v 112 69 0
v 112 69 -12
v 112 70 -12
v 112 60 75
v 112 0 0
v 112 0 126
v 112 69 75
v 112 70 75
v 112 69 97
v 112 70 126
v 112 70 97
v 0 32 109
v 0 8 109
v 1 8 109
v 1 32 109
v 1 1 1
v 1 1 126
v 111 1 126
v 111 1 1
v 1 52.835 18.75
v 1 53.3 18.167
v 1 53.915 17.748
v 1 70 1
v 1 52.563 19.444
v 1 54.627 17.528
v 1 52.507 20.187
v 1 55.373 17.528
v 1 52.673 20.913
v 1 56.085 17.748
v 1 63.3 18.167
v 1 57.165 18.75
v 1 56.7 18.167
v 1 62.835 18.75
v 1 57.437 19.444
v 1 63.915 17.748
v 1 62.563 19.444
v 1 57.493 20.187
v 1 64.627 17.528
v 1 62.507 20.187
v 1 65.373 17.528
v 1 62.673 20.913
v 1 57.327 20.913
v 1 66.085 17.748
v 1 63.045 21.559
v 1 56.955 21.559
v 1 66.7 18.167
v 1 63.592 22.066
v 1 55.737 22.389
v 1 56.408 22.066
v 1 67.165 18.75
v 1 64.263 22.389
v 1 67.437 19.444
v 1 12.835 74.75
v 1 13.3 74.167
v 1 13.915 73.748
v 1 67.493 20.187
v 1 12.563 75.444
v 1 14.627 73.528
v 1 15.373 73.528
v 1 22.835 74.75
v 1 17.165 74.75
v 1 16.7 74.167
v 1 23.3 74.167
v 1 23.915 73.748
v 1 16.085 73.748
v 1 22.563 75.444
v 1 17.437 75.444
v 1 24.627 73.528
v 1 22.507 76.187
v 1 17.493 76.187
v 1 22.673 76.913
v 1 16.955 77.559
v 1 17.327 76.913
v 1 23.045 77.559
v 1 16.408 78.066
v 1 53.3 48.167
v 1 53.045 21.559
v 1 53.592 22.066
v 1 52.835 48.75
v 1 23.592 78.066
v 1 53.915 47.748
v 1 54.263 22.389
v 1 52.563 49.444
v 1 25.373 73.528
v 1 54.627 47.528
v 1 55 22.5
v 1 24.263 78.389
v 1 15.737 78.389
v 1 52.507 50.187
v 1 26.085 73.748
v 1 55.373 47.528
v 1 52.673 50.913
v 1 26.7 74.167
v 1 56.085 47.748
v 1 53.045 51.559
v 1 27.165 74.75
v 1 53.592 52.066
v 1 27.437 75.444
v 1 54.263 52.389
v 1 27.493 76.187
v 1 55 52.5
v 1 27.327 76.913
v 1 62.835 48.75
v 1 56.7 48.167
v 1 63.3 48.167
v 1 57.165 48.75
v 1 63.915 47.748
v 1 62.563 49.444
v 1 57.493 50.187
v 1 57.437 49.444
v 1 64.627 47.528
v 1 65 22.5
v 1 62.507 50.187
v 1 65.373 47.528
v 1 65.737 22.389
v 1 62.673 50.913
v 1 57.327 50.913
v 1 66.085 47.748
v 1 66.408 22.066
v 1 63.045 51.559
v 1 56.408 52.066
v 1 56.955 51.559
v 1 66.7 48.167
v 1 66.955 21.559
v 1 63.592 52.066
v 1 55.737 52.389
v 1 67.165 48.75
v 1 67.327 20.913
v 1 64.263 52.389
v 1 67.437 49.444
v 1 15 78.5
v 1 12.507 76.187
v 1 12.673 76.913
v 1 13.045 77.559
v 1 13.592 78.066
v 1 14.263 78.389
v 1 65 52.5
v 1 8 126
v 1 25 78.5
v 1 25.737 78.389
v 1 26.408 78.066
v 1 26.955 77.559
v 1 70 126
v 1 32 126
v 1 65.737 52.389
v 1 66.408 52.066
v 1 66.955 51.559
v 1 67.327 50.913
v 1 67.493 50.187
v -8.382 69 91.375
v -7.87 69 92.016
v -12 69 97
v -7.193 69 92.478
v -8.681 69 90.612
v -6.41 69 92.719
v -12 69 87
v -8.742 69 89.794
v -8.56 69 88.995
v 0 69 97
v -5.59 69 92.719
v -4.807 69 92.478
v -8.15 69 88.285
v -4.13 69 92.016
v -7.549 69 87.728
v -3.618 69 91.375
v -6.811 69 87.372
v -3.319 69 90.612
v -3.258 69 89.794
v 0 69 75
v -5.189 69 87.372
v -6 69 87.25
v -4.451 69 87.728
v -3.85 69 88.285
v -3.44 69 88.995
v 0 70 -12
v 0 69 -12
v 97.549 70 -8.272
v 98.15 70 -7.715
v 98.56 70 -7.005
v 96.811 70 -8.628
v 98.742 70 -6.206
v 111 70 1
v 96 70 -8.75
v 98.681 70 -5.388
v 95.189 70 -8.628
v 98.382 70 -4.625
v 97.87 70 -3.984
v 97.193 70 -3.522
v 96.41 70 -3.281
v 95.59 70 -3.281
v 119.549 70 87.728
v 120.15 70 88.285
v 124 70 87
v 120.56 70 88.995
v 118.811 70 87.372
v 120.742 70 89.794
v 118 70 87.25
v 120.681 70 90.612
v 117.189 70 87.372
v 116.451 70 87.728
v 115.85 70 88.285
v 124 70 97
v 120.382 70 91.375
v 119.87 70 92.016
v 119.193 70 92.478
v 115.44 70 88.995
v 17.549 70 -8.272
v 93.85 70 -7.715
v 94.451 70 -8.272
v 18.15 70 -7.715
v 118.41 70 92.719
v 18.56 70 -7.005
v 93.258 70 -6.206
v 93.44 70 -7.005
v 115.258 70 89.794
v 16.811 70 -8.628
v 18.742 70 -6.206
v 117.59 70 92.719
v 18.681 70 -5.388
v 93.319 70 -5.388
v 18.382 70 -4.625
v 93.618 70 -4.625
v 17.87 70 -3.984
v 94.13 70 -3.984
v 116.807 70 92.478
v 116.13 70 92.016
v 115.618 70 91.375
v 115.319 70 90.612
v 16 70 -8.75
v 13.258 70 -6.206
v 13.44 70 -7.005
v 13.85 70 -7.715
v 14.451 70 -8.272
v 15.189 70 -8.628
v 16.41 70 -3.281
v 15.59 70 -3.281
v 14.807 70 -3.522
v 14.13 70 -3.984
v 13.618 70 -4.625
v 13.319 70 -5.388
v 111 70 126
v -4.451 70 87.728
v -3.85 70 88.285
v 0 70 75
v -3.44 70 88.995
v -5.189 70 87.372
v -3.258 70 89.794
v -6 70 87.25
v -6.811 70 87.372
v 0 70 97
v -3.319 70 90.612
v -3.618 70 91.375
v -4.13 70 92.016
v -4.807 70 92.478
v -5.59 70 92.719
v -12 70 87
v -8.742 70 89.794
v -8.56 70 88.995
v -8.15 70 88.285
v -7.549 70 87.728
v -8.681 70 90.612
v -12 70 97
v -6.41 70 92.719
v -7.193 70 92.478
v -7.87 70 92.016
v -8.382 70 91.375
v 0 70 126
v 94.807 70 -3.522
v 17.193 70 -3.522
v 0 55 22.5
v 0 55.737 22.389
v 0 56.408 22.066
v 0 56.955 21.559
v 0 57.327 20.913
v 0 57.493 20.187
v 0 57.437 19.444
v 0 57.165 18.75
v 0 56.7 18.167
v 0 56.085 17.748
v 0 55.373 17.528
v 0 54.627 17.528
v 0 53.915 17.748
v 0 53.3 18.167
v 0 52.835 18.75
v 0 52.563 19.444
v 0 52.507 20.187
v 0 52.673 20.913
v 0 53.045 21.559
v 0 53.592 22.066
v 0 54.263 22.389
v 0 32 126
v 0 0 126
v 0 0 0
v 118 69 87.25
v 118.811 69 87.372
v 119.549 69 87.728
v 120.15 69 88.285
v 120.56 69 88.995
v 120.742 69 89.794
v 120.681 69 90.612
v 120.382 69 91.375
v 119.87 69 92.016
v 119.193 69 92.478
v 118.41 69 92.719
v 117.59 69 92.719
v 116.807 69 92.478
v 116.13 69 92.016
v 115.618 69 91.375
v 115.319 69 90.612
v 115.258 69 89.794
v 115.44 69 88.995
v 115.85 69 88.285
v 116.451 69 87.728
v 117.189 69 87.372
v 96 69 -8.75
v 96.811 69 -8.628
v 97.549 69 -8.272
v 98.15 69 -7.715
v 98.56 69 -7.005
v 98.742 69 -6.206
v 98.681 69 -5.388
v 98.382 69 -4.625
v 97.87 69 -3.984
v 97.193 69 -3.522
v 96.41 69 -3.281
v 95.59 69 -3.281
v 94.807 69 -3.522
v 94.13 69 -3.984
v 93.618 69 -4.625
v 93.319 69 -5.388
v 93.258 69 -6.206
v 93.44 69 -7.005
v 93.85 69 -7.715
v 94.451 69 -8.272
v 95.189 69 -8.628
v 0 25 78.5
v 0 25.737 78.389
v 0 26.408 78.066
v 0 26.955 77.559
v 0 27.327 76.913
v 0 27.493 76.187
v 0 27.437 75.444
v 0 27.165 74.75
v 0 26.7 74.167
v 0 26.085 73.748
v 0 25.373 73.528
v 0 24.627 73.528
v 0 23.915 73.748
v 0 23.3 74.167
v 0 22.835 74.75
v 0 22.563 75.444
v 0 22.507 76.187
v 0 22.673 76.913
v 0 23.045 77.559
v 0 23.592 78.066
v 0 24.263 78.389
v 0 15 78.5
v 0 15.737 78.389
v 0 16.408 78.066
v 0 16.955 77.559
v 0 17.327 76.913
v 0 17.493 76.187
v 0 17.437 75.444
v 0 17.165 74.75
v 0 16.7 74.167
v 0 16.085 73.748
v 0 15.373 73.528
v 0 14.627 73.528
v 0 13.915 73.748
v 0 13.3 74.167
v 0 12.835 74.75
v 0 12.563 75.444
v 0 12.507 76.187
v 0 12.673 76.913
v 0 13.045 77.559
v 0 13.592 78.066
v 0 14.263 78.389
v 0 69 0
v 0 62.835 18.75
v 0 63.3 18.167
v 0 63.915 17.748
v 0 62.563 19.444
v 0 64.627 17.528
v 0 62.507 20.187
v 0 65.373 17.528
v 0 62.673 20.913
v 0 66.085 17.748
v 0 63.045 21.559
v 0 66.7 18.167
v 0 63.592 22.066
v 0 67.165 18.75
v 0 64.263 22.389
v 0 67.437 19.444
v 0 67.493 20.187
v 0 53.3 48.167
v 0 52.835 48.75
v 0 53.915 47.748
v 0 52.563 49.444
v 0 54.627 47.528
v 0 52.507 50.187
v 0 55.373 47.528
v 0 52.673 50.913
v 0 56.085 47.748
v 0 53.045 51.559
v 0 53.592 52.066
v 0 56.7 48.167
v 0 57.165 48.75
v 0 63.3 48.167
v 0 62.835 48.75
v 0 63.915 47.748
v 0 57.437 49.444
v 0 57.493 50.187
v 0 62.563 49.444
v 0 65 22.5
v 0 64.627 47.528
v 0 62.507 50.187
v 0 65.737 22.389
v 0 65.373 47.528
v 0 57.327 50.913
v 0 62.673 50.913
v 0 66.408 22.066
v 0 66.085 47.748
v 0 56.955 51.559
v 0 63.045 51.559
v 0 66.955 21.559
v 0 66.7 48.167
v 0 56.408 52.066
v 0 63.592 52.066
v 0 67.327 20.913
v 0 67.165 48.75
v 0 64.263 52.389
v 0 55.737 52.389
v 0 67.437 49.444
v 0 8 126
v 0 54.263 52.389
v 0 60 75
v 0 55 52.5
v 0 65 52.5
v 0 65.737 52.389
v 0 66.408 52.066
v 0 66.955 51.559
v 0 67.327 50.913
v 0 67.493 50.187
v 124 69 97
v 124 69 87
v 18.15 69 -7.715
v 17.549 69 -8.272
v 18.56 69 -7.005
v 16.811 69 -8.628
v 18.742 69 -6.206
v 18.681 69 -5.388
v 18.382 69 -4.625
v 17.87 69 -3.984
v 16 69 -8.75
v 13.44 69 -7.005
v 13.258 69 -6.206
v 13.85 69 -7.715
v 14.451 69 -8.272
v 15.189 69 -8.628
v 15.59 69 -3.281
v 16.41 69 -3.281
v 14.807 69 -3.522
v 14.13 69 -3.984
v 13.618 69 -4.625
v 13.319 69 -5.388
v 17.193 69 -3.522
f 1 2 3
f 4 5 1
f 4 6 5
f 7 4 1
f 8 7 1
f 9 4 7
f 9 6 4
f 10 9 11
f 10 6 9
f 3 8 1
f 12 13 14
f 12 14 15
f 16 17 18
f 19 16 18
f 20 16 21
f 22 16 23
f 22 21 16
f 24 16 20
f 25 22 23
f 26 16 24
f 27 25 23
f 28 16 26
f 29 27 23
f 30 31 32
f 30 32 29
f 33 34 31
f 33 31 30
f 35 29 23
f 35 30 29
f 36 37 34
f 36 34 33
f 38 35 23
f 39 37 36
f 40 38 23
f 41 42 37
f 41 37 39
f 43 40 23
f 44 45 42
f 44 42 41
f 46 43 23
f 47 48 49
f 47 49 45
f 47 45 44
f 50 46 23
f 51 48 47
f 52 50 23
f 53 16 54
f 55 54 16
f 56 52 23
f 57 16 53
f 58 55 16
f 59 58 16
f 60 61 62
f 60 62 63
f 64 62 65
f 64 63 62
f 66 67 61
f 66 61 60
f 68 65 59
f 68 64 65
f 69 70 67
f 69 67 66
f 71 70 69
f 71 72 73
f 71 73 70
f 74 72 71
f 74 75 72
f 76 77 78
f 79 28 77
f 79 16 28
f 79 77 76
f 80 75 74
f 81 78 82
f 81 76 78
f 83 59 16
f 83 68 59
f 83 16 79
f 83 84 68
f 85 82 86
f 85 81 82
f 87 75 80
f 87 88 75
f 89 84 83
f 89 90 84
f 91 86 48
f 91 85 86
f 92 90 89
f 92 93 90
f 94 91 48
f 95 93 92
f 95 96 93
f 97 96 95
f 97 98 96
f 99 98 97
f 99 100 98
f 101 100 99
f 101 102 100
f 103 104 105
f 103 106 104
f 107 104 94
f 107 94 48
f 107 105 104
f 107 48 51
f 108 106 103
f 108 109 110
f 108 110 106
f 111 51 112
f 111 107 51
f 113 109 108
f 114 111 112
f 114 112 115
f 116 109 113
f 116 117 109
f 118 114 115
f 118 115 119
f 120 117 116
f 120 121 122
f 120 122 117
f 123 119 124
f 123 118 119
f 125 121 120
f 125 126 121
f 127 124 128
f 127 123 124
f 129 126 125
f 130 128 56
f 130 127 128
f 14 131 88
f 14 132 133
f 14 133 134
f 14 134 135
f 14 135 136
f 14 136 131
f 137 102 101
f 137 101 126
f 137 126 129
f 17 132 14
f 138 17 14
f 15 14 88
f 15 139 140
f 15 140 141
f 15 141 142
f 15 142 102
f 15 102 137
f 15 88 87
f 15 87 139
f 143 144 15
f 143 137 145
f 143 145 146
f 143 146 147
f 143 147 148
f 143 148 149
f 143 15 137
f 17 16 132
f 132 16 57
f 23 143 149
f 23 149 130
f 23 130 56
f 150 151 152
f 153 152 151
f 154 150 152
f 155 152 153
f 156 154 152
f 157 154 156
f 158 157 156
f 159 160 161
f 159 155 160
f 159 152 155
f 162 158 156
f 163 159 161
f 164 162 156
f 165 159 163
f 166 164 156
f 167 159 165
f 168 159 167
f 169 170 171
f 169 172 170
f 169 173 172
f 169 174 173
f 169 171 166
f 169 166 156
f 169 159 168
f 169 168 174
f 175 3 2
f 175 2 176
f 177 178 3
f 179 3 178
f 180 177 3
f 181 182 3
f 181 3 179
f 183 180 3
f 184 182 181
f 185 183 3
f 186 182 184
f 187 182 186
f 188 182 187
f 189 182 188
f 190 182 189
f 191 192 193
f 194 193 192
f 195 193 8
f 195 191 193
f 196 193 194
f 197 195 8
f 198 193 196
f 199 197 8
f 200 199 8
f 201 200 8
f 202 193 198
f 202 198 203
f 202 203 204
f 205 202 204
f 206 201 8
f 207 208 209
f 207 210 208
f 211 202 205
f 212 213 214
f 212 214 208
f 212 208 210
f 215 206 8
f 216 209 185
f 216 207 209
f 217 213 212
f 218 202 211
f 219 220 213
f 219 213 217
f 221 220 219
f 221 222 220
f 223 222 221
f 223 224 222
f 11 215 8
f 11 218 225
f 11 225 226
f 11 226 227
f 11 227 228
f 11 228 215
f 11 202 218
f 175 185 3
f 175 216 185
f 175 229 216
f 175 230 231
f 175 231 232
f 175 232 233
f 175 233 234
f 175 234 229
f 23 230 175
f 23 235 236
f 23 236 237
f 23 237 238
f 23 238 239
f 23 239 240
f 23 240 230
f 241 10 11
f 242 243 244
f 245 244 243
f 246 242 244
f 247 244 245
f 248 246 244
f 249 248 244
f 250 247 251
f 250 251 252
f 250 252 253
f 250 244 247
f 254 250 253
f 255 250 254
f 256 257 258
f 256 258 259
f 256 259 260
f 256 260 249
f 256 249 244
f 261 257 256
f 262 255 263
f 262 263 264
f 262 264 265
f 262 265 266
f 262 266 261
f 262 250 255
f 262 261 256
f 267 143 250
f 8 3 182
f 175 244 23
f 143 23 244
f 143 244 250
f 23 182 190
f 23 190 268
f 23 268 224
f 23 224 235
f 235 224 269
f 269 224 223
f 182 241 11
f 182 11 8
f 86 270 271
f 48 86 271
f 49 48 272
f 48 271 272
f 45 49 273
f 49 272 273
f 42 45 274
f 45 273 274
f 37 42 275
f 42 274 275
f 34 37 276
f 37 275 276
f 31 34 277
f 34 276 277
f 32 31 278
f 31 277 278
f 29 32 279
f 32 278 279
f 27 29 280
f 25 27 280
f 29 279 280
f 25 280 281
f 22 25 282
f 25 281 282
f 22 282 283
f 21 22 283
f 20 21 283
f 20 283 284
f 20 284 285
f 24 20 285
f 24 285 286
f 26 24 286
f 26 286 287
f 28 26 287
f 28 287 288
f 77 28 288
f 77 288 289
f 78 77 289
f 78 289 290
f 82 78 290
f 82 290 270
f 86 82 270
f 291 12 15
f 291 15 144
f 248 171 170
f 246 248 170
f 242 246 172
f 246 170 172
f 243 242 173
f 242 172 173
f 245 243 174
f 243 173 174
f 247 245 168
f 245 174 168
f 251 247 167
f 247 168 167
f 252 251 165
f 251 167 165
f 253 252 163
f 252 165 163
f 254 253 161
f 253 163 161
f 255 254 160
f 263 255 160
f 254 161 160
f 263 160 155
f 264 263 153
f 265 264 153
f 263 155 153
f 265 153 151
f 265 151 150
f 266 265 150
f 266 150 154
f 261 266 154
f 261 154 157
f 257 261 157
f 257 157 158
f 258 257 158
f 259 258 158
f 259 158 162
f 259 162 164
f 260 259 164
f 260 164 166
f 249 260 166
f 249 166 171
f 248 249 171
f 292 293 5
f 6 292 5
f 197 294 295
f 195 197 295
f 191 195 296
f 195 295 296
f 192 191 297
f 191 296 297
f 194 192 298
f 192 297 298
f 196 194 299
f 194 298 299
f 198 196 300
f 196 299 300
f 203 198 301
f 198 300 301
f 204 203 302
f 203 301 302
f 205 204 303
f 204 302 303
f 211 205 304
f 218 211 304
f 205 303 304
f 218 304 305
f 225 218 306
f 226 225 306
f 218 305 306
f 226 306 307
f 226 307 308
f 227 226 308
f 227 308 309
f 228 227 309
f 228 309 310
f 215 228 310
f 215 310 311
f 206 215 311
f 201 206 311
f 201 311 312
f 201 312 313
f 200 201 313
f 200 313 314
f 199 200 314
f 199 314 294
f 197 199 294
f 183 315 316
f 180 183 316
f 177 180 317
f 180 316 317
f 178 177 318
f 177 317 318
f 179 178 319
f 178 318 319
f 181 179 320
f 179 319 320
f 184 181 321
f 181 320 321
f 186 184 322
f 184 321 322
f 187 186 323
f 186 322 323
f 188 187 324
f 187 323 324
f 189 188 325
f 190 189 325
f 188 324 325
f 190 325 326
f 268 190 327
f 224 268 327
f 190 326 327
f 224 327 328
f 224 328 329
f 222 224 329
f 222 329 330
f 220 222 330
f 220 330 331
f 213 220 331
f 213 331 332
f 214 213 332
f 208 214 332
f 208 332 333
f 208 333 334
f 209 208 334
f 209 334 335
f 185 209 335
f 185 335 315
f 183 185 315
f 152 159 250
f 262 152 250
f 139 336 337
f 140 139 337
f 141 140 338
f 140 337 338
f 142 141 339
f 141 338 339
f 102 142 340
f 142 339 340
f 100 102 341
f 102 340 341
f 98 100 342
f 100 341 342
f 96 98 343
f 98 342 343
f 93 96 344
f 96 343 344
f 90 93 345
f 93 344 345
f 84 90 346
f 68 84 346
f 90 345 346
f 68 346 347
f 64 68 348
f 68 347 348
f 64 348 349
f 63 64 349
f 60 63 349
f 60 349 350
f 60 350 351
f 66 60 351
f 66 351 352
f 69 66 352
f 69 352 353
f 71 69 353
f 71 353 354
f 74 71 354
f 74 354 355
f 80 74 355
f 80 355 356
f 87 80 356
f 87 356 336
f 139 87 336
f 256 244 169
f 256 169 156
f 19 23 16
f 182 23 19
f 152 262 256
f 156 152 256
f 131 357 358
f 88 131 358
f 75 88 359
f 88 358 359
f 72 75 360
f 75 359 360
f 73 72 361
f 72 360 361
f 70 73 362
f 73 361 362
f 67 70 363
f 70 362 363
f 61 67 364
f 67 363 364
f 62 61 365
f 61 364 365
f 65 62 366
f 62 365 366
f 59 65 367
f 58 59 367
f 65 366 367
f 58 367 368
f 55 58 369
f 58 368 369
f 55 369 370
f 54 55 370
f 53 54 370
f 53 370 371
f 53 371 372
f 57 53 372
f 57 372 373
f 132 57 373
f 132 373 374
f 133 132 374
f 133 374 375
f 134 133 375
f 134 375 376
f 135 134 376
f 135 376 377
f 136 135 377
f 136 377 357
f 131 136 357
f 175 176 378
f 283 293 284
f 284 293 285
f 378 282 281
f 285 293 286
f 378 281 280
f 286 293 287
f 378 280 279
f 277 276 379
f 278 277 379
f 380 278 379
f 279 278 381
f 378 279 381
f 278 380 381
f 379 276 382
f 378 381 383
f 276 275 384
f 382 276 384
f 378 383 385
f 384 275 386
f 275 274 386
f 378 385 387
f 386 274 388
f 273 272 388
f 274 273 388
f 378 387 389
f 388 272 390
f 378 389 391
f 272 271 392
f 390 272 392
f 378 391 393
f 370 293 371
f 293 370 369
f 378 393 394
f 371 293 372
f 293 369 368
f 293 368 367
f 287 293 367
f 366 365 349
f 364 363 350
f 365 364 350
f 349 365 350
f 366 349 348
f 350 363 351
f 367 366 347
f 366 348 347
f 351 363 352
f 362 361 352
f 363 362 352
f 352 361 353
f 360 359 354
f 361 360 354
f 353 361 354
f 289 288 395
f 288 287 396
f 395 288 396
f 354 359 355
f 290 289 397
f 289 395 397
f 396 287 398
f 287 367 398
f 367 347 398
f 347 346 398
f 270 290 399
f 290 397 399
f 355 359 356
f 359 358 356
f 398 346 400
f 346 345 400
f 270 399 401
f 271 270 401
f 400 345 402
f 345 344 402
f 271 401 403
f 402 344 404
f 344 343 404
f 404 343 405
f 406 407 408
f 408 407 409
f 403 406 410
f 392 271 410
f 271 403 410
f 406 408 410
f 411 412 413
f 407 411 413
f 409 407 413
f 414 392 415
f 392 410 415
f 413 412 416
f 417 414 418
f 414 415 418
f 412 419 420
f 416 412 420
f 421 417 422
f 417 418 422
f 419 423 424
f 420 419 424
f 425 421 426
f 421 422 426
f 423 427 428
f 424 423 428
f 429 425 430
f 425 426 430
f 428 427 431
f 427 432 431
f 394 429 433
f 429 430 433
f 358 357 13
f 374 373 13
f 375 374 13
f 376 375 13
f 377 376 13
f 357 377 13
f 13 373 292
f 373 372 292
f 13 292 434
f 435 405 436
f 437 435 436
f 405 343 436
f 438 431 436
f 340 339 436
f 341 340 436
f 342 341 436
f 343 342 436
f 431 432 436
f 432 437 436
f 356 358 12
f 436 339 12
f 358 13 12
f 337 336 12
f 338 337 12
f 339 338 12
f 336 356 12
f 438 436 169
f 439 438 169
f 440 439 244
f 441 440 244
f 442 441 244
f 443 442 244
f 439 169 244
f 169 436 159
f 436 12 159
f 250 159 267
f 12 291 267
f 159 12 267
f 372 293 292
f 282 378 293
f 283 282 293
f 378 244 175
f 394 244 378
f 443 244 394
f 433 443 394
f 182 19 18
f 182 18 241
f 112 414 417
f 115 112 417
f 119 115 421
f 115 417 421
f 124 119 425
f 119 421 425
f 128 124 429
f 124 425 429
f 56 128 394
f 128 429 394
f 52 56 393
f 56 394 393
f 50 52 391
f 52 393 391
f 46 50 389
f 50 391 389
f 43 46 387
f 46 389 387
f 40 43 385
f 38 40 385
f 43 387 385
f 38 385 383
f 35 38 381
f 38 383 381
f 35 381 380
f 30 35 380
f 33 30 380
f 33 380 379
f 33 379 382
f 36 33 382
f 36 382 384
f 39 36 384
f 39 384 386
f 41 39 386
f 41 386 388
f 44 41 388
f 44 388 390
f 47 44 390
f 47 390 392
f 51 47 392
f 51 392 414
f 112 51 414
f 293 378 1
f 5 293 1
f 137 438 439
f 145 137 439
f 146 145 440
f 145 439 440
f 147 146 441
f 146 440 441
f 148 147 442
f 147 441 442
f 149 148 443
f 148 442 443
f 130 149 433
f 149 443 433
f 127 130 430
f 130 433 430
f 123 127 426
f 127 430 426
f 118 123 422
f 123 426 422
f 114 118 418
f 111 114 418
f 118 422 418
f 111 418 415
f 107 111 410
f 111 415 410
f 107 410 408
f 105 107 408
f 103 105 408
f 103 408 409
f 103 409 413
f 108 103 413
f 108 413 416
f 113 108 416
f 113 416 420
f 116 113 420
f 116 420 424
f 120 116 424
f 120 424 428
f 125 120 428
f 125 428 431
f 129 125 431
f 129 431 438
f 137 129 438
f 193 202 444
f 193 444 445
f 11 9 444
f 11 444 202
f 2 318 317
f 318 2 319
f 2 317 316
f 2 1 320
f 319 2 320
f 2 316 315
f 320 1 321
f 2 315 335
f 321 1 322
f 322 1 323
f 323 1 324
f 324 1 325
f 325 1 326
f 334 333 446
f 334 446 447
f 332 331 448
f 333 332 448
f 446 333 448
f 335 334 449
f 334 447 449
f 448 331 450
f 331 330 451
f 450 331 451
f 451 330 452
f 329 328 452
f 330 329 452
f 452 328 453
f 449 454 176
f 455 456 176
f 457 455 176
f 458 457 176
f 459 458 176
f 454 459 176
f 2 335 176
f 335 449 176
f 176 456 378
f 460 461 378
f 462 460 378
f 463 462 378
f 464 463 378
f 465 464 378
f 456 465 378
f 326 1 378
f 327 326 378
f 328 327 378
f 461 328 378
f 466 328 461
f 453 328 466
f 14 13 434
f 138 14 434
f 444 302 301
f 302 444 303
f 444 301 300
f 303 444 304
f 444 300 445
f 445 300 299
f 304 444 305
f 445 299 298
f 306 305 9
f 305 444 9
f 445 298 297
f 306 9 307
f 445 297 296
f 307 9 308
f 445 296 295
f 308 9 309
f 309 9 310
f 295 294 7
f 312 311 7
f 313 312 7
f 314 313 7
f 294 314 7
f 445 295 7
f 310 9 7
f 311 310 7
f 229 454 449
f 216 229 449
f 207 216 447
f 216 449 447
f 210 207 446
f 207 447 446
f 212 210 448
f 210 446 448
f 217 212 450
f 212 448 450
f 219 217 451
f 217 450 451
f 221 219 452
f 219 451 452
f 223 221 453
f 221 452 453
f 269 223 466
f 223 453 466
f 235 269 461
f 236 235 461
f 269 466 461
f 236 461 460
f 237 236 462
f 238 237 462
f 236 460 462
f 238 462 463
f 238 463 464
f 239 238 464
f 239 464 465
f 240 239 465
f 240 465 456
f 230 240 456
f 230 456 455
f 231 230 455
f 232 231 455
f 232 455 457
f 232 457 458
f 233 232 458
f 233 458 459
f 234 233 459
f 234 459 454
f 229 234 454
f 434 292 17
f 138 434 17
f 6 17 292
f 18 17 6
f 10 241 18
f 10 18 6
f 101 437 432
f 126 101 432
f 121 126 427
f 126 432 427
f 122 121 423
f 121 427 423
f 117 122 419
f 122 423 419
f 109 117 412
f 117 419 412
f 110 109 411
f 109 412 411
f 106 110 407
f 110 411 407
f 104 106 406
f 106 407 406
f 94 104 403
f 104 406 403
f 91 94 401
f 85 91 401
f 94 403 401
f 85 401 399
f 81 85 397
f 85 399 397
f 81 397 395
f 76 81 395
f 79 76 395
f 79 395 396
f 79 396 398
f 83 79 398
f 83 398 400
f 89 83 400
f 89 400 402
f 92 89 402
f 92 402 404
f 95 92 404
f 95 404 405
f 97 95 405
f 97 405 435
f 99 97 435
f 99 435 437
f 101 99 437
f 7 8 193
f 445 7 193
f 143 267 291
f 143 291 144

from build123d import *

# Parameters (mm, degrees)
SKETCH_1_W          = 112
SKETCH_1_H          = 70
EXTRUDE_1_DEPTH     = 126
SKETCH_2_W          = 110
SKETCH_2_H          = 69
CUT_EXTRUDE_1_DEPTH = 125
SKETCH_3_W          = 112
SKETCH_3_H          = 1
EXTRUDE_2_DEPTH     = 12
SKETCH_4_W          = 22
SKETCH_4_H          = 1
EXTRUDE_3_DEPTH     = 12
CUT_EXTRUDE_2_DEPTH = 10
SKETCH_6_R          = 2.75
CUT_EXTRUDE_3_DEPTH = 190.770914526
CUT_EXTRUDE_5_REACH = 192.137
SKETCH_8_W          = 17
SKETCH_8_H          = 24
SKETCH_9_R          = 2.5
CUT_EXTRUDE_6_DEPTH = 10


with BuildPart() as part:
    # 草图1 → 拉伸1 (new body)
    with BuildSketch(Plane.XY):
        with Locations((56, 35)):
            Rectangle(SKETCH_1_W, SKETCH_1_H)
    extrude(amount=EXTRUDE_1_DEPTH)

    # 草图2 → 切除-拉伸1 (cut)
    with BuildSketch(Plane.XY.offset(126)):
        with Locations((56, 35.5)):
            Rectangle(SKETCH_2_W, SKETCH_2_H)
    extrude(amount=-CUT_EXTRUDE_1_DEPTH, mode=Mode.SUBTRACT)

    # 草图3 → 拉伸2 (add)
    with BuildSketch(Plane(origin=(0, 0, 0), x_dir=(-1, 0, 0), z_dir=(0, 0, -1))):
        with Locations((-56, 69.5)):
            Rectangle(SKETCH_3_W, SKETCH_3_H)
    extrude(amount=EXTRUDE_2_DEPTH)

    # 草图4 → 拉伸3 (add)
    with BuildSketch(Plane(origin=(112, 0, 0), x_dir=(0, 0, -1), z_dir=(1, 0, 0))):
        with Locations((-86, 69.5)):
            Rectangle(SKETCH_4_W, SKETCH_4_H)
    extrude_3 = extrude(amount=EXTRUDE_3_DEPTH)

    # 草图5 → 切除-拉伸2 (cut)
    with BuildSketch(Plane(origin=(0, 70, 0), x_dir=(-1, 0, 0), z_dir=(0, 1, 0))):
        Polygon((-112, 75), (-124, 87), (-124, 75), align=None)
    cut_extrude_2 = extrude(amount=-CUT_EXTRUDE_2_DEPTH, mode=Mode.SUBTRACT)

    # 镜向1: 拉伸3 across plane
    add(extrude_3.mirror(Plane.ZY.offset(-56)))

    # 镜向2: 切除-拉伸2 across plane
    add(cut_extrude_2.mirror(Plane.ZY.offset(-56)), mode=Mode.SUBTRACT)

    # 草图6 → 切除-拉伸3 (cut, through all)
    with BuildSketch(Plane.XZ.offset(-69)):
        with Locations(Location((-6, 90, 0), (0, 0, 270))):
            Circle(SKETCH_6_R)
        with Locations(Location((118, 90, 0), (0, 0, 270))):
            Circle(SKETCH_6_R)
        with Locations(Location((16, -6, 0), (0, 0, 270))):
            Circle(SKETCH_6_R)
        with Locations(Location((96, -6, 0), (0, 0, 270))):
            Circle(SKETCH_6_R)
    extrude(amount=-CUT_EXTRUDE_3_DEPTH, mode=Mode.SUBTRACT)

    # 草图8 → 切除-拉伸5 (cut, up to next)
    with BuildSketch(Plane.ZY, mode=Mode.PRIVATE) as cut_extrude_5_sk1:
        with Locations((117.5, 20)):
            Rectangle(SKETCH_8_W, SKETCH_8_H)
    cut_extrude_5_tool1 = extrude(cut_extrude_5_sk1.sketch, amount=-CUT_EXTRUDE_5_REACH, mode=Mode.PRIVATE) & part.part
    add(cut_extrude_5_tool1.solids().sort_by_distance((0, 20, 117.5))[0], mode=Mode.SUBTRACT)

    # 草图9 → 切除-拉伸6 (cut)
    with BuildSketch(Plane.ZY):
        with Locations((20, 65)):
            Circle(SKETCH_9_R)
        with Locations((20, 55)):
            Circle(SKETCH_9_R)
        with Locations((50, 65)):
            Circle(SKETCH_9_R)
        with Locations((50, 55)):
            Circle(SKETCH_9_R)
        with Locations((76, 25)):
            Circle(SKETCH_9_R)
        with Locations((76, 15)):
            Circle(SKETCH_9_R)
    extrude(amount=-CUT_EXTRUDE_6_DEPTH, mode=Mode.SUBTRACT)


solid = part.part
